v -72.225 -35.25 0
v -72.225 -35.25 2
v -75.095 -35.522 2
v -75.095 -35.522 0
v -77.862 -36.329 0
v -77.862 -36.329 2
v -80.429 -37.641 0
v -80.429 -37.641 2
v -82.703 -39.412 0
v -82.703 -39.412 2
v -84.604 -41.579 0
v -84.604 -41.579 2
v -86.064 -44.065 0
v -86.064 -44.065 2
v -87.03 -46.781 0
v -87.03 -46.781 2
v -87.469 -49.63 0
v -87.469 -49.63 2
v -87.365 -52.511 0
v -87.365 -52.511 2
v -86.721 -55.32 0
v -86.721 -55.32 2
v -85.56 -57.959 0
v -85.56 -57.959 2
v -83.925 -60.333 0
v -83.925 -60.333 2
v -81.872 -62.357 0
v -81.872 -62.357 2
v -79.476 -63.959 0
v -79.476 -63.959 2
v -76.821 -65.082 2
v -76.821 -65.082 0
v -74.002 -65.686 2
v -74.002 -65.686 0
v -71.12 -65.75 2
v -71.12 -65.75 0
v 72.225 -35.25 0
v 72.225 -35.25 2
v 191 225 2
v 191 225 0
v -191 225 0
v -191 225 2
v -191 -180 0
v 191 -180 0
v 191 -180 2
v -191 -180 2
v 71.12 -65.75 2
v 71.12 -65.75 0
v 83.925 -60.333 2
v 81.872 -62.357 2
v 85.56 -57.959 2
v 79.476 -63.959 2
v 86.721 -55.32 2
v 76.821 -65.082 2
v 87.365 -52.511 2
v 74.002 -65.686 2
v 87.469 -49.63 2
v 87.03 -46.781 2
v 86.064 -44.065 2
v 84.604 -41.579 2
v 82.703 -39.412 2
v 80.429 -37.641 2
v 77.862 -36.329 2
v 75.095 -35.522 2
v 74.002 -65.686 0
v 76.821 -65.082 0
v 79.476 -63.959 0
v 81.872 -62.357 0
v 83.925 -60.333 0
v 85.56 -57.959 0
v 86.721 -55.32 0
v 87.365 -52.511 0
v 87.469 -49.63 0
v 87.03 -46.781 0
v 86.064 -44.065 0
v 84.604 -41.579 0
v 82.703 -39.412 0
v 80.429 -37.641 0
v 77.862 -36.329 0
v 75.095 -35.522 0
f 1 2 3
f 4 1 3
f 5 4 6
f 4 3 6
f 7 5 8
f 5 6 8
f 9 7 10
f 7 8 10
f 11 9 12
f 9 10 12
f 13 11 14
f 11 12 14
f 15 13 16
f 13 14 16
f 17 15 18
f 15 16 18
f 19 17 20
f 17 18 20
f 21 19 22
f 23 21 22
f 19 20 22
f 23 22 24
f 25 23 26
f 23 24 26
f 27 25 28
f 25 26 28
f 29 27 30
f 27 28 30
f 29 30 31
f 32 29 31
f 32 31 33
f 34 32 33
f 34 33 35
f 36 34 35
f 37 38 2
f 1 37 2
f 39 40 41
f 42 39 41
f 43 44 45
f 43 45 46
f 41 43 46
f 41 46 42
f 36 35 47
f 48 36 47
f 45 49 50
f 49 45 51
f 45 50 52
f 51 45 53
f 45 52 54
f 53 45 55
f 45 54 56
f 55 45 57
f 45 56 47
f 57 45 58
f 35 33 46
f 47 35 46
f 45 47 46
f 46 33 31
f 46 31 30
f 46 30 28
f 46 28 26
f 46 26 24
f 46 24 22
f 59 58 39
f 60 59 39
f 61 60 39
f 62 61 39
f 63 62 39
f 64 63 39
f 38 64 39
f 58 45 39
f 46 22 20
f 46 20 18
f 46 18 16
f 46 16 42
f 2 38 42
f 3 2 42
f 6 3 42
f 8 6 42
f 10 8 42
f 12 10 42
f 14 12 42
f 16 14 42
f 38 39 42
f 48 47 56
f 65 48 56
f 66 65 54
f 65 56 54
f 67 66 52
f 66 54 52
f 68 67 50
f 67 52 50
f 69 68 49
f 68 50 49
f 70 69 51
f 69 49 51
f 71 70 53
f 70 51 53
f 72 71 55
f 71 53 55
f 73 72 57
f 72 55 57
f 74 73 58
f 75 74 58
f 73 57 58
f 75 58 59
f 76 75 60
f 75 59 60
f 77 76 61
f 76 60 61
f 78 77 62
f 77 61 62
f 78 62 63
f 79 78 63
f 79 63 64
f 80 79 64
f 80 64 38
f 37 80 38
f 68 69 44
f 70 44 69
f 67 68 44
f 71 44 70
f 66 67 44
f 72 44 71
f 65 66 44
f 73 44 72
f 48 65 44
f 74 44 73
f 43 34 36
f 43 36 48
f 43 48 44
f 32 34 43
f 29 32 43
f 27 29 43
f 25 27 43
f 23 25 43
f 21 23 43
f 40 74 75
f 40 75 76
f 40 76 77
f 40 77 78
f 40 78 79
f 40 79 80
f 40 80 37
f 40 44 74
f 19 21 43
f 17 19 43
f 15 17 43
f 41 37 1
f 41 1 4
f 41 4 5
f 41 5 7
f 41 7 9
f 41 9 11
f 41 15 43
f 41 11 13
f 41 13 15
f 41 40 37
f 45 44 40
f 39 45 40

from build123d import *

# Parameters (mm, degrees)
SKETCH1_W           = 382
SKETCH1_H           = 405
BOSS_EXTRUDE1_DEPTH = 2
CUT_EXTRUDE2_DEPTH  = 296.144032635


with BuildPart() as part:
    # Sketch1 → Boss-Extrude1 (new body)
    with BuildSketch(Plane(origin=(0, 0, 0), x_dir=(-1, 0, 0), z_dir=(0, 0, -1))):
        with Locations((0, 22.5)):
            Rectangle(SKETCH1_W, SKETCH1_H)
    extrude(amount=-BOSS_EXTRUDE1_DEPTH)

    # Sketch4 → Cut-Extrude2 (cut, through all)
    with BuildSketch(Plane.XY.offset(2)):
        with BuildLine():
            Line((72.225, -35.25), (-72.225, -35.25))
            ThreePointArc((-72.225, -35.25), (-87.484996723, -51.072630075), (-71.120463898, -65.75))
            Line((-71.120463898, -65.75), (71.120463898, -65.75))
            ThreePointArc((71.120463898, -65.75), (87.484996723, -51.072630075), (72.225, -35.25))
        make_face()
    extrude(amount=-CUT_EXTRUDE2_DEPTH, mode=Mode.SUBTRACT)


solid = part.part
